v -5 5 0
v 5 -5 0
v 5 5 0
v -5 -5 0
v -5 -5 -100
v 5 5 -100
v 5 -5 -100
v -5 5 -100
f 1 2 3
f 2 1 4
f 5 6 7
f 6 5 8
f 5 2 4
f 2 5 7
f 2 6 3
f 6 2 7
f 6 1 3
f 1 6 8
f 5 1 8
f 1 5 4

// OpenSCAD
$fn=64;

module extrusion_10x10(length=100, size=10) {
    translate([0,0,-length/2])
        cube([size, size, length], center=true);
}

extrusion_10x10(100, 10);
